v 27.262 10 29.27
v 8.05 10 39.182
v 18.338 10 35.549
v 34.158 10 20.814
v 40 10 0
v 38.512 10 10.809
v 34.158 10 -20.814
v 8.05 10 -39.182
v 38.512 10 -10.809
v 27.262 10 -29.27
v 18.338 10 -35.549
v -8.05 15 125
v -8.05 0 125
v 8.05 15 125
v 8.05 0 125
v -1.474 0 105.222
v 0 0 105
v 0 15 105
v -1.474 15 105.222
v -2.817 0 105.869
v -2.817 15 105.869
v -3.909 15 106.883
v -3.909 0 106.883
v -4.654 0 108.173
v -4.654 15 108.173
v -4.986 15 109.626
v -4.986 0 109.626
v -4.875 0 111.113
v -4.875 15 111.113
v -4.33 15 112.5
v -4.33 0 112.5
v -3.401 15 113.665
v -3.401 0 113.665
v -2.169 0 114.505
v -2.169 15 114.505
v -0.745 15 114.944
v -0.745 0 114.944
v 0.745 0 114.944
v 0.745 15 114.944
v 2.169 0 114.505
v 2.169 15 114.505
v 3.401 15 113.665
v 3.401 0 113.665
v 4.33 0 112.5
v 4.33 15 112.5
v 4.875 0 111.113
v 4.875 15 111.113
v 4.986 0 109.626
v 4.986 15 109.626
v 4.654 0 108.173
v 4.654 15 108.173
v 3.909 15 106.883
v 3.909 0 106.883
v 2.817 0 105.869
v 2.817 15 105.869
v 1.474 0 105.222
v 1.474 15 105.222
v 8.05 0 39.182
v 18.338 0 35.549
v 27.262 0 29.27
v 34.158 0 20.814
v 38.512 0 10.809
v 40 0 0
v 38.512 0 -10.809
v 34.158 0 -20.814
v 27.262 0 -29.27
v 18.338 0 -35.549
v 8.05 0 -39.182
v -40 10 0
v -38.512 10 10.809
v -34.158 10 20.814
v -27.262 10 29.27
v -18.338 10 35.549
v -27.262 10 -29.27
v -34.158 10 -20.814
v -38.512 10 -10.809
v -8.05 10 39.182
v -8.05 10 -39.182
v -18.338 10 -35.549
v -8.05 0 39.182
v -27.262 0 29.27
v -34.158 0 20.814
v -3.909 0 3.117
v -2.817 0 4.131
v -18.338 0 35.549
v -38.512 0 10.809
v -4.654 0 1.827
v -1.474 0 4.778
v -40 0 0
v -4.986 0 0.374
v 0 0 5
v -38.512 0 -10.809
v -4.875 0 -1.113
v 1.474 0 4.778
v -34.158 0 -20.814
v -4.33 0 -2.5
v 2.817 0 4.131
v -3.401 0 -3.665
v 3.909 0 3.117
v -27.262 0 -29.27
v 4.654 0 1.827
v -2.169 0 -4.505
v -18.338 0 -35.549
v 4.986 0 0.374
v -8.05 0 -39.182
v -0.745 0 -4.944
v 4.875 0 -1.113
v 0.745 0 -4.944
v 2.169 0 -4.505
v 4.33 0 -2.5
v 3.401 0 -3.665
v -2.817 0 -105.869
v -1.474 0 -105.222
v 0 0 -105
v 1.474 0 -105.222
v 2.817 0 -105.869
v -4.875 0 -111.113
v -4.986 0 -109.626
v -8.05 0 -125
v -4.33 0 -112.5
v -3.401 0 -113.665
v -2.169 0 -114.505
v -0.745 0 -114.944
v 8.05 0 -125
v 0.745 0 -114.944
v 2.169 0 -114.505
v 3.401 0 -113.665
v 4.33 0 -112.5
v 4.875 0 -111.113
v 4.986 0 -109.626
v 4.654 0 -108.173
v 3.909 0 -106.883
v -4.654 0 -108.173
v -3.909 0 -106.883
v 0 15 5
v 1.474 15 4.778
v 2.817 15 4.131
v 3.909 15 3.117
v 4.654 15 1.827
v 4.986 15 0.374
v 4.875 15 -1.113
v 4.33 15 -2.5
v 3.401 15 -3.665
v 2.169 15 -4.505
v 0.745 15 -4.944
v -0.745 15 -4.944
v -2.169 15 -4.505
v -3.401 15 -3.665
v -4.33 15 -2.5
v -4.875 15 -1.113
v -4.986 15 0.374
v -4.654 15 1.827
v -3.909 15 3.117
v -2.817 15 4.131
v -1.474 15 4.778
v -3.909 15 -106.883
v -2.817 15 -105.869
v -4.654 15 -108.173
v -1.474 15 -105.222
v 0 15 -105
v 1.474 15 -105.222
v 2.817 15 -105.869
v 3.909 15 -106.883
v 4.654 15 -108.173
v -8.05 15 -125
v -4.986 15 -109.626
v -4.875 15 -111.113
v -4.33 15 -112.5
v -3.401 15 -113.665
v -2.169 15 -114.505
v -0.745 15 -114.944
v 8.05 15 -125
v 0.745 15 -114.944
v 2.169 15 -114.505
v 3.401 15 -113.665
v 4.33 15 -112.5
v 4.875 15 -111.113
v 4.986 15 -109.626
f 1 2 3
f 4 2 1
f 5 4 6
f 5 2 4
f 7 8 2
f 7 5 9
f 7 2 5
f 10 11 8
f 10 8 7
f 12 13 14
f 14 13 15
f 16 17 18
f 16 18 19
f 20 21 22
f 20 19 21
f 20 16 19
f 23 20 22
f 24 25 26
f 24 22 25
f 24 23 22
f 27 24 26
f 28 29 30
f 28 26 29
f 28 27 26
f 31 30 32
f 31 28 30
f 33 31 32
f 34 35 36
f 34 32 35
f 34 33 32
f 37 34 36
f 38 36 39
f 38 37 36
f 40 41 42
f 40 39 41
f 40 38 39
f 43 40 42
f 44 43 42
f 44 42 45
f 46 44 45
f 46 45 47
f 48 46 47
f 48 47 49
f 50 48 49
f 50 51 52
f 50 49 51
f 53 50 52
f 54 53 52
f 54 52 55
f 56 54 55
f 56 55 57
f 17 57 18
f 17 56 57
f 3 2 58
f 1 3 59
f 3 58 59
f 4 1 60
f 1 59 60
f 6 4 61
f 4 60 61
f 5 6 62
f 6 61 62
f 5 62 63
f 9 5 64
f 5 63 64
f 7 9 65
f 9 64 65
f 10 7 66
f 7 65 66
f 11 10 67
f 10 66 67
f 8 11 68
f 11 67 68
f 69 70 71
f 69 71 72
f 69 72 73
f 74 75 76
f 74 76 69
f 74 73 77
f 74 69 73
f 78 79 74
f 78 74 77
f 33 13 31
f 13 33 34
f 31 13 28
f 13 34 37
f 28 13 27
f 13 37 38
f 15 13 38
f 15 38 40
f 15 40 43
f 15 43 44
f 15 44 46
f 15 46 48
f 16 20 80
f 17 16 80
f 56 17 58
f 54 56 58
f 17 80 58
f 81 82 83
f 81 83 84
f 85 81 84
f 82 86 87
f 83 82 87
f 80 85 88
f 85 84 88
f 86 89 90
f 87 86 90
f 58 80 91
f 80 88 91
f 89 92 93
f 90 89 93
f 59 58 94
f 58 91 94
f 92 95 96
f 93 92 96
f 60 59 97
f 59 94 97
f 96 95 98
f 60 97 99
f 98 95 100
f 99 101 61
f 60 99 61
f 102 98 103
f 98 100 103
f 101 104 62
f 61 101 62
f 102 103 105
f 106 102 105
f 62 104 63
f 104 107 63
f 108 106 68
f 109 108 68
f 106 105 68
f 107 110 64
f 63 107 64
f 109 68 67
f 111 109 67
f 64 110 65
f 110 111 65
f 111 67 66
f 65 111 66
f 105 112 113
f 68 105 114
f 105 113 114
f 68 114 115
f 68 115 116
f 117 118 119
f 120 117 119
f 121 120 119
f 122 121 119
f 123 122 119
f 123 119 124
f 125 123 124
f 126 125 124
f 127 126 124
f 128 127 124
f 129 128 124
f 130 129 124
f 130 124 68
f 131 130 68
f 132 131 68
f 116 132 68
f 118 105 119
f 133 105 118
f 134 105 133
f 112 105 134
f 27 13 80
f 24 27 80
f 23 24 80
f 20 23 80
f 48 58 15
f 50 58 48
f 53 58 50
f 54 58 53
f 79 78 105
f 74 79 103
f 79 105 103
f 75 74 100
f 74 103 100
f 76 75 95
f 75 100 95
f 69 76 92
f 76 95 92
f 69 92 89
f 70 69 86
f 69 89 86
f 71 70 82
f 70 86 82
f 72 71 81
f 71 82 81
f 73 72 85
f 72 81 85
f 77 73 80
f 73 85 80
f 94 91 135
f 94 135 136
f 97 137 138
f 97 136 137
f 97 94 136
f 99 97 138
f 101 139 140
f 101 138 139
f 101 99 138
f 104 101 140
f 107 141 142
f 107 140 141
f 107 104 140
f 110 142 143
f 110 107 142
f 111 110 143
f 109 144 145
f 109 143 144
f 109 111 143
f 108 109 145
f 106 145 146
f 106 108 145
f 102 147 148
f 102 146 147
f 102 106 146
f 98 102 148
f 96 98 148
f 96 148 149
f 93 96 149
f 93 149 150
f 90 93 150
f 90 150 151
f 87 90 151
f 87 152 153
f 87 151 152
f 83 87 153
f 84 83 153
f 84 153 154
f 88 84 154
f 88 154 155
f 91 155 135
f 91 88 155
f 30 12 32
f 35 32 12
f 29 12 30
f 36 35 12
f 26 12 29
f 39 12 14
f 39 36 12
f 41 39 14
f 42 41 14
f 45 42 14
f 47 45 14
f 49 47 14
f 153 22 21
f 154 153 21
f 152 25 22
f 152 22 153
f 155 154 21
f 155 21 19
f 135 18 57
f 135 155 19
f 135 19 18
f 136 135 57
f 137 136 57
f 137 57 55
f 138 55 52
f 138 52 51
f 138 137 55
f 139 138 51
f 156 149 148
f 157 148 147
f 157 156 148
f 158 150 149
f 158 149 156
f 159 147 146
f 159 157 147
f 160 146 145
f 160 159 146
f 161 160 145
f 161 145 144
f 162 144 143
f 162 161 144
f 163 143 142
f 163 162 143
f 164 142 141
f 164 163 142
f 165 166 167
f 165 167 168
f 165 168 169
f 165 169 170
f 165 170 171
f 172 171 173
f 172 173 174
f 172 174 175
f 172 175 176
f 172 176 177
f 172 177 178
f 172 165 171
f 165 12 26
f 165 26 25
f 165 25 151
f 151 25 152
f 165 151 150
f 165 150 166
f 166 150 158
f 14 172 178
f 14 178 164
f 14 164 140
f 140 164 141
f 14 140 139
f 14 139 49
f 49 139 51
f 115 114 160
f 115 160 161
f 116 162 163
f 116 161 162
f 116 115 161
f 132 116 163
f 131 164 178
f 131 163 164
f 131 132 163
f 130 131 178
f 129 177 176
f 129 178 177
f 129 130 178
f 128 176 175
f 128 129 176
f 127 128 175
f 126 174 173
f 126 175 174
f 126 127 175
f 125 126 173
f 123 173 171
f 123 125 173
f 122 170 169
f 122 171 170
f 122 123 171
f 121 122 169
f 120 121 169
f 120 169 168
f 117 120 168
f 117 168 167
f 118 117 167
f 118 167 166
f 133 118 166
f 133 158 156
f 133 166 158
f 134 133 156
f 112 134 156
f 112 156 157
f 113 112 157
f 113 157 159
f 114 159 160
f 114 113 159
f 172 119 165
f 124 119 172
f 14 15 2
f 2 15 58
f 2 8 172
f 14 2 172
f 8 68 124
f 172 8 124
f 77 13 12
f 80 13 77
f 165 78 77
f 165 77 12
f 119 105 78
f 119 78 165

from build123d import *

# Parameters (mm, degrees)
CROQUIS1_W                 = 16.099128824
CROQUIS1_H                 = 250
SALIENTE_EXTRUIR1_DEPTH    = 15
CROQUIS2_R                 = 40
SALIENTE_EXTRUIR2_DEPTH    = 10
CORTAR_EXTRUIR1_DEPTH      = 133.098448136
CORTAR_EXTRUIR1_DEPTH_BACK = 133.098448136
CROQUIS3_R                 = 5


with BuildPart() as part:
    # Croquis1 → Saliente-Extruir1 (new body)
    with BuildSketch(Plane(origin=(0, 0, 0), x_dir=(1, 0, 0), z_dir=(0, 1, 0))):
        Rectangle(CROQUIS1_W, CROQUIS1_H)
    extrude(amount=SALIENTE_EXTRUIR1_DEPTH)

    # Croquis2 → Saliente-Extruir2 (add)
    with BuildSketch(Plane(origin=(0, 0, 0), x_dir=(1, 0, 0), z_dir=(0, 1, 0))):
        Circle(CROQUIS2_R)
    extrude(amount=SALIENTE_EXTRUIR2_DEPTH)

    # Croquis3 → Cortar-Extruir1 (cut, two sides: drawn at the far end of the back side and taken through both)
    with BuildSketch(Plane(origin=(0, 0, 0), x_dir=(1, 0, 0), z_dir=(0, 1, 0)).offset(-CORTAR_EXTRUIR1_DEPTH_BACK)):
        with Locations(Location((0, 0, 0), (0, 0, 270))):
            Circle(CROQUIS3_R)
        with Locations(Location((0, 110, 0), (0, 0, 270))):
            Circle(CROQUIS3_R)
        with Locations(Location((0, -110, 0), (0, 0, 90))):
            Circle(CROQUIS3_R)
    extrude(amount=CORTAR_EXTRUIR1_DEPTH + CORTAR_EXTRUIR1_DEPTH_BACK, mode=Mode.SUBTRACT)


solid = part.part
